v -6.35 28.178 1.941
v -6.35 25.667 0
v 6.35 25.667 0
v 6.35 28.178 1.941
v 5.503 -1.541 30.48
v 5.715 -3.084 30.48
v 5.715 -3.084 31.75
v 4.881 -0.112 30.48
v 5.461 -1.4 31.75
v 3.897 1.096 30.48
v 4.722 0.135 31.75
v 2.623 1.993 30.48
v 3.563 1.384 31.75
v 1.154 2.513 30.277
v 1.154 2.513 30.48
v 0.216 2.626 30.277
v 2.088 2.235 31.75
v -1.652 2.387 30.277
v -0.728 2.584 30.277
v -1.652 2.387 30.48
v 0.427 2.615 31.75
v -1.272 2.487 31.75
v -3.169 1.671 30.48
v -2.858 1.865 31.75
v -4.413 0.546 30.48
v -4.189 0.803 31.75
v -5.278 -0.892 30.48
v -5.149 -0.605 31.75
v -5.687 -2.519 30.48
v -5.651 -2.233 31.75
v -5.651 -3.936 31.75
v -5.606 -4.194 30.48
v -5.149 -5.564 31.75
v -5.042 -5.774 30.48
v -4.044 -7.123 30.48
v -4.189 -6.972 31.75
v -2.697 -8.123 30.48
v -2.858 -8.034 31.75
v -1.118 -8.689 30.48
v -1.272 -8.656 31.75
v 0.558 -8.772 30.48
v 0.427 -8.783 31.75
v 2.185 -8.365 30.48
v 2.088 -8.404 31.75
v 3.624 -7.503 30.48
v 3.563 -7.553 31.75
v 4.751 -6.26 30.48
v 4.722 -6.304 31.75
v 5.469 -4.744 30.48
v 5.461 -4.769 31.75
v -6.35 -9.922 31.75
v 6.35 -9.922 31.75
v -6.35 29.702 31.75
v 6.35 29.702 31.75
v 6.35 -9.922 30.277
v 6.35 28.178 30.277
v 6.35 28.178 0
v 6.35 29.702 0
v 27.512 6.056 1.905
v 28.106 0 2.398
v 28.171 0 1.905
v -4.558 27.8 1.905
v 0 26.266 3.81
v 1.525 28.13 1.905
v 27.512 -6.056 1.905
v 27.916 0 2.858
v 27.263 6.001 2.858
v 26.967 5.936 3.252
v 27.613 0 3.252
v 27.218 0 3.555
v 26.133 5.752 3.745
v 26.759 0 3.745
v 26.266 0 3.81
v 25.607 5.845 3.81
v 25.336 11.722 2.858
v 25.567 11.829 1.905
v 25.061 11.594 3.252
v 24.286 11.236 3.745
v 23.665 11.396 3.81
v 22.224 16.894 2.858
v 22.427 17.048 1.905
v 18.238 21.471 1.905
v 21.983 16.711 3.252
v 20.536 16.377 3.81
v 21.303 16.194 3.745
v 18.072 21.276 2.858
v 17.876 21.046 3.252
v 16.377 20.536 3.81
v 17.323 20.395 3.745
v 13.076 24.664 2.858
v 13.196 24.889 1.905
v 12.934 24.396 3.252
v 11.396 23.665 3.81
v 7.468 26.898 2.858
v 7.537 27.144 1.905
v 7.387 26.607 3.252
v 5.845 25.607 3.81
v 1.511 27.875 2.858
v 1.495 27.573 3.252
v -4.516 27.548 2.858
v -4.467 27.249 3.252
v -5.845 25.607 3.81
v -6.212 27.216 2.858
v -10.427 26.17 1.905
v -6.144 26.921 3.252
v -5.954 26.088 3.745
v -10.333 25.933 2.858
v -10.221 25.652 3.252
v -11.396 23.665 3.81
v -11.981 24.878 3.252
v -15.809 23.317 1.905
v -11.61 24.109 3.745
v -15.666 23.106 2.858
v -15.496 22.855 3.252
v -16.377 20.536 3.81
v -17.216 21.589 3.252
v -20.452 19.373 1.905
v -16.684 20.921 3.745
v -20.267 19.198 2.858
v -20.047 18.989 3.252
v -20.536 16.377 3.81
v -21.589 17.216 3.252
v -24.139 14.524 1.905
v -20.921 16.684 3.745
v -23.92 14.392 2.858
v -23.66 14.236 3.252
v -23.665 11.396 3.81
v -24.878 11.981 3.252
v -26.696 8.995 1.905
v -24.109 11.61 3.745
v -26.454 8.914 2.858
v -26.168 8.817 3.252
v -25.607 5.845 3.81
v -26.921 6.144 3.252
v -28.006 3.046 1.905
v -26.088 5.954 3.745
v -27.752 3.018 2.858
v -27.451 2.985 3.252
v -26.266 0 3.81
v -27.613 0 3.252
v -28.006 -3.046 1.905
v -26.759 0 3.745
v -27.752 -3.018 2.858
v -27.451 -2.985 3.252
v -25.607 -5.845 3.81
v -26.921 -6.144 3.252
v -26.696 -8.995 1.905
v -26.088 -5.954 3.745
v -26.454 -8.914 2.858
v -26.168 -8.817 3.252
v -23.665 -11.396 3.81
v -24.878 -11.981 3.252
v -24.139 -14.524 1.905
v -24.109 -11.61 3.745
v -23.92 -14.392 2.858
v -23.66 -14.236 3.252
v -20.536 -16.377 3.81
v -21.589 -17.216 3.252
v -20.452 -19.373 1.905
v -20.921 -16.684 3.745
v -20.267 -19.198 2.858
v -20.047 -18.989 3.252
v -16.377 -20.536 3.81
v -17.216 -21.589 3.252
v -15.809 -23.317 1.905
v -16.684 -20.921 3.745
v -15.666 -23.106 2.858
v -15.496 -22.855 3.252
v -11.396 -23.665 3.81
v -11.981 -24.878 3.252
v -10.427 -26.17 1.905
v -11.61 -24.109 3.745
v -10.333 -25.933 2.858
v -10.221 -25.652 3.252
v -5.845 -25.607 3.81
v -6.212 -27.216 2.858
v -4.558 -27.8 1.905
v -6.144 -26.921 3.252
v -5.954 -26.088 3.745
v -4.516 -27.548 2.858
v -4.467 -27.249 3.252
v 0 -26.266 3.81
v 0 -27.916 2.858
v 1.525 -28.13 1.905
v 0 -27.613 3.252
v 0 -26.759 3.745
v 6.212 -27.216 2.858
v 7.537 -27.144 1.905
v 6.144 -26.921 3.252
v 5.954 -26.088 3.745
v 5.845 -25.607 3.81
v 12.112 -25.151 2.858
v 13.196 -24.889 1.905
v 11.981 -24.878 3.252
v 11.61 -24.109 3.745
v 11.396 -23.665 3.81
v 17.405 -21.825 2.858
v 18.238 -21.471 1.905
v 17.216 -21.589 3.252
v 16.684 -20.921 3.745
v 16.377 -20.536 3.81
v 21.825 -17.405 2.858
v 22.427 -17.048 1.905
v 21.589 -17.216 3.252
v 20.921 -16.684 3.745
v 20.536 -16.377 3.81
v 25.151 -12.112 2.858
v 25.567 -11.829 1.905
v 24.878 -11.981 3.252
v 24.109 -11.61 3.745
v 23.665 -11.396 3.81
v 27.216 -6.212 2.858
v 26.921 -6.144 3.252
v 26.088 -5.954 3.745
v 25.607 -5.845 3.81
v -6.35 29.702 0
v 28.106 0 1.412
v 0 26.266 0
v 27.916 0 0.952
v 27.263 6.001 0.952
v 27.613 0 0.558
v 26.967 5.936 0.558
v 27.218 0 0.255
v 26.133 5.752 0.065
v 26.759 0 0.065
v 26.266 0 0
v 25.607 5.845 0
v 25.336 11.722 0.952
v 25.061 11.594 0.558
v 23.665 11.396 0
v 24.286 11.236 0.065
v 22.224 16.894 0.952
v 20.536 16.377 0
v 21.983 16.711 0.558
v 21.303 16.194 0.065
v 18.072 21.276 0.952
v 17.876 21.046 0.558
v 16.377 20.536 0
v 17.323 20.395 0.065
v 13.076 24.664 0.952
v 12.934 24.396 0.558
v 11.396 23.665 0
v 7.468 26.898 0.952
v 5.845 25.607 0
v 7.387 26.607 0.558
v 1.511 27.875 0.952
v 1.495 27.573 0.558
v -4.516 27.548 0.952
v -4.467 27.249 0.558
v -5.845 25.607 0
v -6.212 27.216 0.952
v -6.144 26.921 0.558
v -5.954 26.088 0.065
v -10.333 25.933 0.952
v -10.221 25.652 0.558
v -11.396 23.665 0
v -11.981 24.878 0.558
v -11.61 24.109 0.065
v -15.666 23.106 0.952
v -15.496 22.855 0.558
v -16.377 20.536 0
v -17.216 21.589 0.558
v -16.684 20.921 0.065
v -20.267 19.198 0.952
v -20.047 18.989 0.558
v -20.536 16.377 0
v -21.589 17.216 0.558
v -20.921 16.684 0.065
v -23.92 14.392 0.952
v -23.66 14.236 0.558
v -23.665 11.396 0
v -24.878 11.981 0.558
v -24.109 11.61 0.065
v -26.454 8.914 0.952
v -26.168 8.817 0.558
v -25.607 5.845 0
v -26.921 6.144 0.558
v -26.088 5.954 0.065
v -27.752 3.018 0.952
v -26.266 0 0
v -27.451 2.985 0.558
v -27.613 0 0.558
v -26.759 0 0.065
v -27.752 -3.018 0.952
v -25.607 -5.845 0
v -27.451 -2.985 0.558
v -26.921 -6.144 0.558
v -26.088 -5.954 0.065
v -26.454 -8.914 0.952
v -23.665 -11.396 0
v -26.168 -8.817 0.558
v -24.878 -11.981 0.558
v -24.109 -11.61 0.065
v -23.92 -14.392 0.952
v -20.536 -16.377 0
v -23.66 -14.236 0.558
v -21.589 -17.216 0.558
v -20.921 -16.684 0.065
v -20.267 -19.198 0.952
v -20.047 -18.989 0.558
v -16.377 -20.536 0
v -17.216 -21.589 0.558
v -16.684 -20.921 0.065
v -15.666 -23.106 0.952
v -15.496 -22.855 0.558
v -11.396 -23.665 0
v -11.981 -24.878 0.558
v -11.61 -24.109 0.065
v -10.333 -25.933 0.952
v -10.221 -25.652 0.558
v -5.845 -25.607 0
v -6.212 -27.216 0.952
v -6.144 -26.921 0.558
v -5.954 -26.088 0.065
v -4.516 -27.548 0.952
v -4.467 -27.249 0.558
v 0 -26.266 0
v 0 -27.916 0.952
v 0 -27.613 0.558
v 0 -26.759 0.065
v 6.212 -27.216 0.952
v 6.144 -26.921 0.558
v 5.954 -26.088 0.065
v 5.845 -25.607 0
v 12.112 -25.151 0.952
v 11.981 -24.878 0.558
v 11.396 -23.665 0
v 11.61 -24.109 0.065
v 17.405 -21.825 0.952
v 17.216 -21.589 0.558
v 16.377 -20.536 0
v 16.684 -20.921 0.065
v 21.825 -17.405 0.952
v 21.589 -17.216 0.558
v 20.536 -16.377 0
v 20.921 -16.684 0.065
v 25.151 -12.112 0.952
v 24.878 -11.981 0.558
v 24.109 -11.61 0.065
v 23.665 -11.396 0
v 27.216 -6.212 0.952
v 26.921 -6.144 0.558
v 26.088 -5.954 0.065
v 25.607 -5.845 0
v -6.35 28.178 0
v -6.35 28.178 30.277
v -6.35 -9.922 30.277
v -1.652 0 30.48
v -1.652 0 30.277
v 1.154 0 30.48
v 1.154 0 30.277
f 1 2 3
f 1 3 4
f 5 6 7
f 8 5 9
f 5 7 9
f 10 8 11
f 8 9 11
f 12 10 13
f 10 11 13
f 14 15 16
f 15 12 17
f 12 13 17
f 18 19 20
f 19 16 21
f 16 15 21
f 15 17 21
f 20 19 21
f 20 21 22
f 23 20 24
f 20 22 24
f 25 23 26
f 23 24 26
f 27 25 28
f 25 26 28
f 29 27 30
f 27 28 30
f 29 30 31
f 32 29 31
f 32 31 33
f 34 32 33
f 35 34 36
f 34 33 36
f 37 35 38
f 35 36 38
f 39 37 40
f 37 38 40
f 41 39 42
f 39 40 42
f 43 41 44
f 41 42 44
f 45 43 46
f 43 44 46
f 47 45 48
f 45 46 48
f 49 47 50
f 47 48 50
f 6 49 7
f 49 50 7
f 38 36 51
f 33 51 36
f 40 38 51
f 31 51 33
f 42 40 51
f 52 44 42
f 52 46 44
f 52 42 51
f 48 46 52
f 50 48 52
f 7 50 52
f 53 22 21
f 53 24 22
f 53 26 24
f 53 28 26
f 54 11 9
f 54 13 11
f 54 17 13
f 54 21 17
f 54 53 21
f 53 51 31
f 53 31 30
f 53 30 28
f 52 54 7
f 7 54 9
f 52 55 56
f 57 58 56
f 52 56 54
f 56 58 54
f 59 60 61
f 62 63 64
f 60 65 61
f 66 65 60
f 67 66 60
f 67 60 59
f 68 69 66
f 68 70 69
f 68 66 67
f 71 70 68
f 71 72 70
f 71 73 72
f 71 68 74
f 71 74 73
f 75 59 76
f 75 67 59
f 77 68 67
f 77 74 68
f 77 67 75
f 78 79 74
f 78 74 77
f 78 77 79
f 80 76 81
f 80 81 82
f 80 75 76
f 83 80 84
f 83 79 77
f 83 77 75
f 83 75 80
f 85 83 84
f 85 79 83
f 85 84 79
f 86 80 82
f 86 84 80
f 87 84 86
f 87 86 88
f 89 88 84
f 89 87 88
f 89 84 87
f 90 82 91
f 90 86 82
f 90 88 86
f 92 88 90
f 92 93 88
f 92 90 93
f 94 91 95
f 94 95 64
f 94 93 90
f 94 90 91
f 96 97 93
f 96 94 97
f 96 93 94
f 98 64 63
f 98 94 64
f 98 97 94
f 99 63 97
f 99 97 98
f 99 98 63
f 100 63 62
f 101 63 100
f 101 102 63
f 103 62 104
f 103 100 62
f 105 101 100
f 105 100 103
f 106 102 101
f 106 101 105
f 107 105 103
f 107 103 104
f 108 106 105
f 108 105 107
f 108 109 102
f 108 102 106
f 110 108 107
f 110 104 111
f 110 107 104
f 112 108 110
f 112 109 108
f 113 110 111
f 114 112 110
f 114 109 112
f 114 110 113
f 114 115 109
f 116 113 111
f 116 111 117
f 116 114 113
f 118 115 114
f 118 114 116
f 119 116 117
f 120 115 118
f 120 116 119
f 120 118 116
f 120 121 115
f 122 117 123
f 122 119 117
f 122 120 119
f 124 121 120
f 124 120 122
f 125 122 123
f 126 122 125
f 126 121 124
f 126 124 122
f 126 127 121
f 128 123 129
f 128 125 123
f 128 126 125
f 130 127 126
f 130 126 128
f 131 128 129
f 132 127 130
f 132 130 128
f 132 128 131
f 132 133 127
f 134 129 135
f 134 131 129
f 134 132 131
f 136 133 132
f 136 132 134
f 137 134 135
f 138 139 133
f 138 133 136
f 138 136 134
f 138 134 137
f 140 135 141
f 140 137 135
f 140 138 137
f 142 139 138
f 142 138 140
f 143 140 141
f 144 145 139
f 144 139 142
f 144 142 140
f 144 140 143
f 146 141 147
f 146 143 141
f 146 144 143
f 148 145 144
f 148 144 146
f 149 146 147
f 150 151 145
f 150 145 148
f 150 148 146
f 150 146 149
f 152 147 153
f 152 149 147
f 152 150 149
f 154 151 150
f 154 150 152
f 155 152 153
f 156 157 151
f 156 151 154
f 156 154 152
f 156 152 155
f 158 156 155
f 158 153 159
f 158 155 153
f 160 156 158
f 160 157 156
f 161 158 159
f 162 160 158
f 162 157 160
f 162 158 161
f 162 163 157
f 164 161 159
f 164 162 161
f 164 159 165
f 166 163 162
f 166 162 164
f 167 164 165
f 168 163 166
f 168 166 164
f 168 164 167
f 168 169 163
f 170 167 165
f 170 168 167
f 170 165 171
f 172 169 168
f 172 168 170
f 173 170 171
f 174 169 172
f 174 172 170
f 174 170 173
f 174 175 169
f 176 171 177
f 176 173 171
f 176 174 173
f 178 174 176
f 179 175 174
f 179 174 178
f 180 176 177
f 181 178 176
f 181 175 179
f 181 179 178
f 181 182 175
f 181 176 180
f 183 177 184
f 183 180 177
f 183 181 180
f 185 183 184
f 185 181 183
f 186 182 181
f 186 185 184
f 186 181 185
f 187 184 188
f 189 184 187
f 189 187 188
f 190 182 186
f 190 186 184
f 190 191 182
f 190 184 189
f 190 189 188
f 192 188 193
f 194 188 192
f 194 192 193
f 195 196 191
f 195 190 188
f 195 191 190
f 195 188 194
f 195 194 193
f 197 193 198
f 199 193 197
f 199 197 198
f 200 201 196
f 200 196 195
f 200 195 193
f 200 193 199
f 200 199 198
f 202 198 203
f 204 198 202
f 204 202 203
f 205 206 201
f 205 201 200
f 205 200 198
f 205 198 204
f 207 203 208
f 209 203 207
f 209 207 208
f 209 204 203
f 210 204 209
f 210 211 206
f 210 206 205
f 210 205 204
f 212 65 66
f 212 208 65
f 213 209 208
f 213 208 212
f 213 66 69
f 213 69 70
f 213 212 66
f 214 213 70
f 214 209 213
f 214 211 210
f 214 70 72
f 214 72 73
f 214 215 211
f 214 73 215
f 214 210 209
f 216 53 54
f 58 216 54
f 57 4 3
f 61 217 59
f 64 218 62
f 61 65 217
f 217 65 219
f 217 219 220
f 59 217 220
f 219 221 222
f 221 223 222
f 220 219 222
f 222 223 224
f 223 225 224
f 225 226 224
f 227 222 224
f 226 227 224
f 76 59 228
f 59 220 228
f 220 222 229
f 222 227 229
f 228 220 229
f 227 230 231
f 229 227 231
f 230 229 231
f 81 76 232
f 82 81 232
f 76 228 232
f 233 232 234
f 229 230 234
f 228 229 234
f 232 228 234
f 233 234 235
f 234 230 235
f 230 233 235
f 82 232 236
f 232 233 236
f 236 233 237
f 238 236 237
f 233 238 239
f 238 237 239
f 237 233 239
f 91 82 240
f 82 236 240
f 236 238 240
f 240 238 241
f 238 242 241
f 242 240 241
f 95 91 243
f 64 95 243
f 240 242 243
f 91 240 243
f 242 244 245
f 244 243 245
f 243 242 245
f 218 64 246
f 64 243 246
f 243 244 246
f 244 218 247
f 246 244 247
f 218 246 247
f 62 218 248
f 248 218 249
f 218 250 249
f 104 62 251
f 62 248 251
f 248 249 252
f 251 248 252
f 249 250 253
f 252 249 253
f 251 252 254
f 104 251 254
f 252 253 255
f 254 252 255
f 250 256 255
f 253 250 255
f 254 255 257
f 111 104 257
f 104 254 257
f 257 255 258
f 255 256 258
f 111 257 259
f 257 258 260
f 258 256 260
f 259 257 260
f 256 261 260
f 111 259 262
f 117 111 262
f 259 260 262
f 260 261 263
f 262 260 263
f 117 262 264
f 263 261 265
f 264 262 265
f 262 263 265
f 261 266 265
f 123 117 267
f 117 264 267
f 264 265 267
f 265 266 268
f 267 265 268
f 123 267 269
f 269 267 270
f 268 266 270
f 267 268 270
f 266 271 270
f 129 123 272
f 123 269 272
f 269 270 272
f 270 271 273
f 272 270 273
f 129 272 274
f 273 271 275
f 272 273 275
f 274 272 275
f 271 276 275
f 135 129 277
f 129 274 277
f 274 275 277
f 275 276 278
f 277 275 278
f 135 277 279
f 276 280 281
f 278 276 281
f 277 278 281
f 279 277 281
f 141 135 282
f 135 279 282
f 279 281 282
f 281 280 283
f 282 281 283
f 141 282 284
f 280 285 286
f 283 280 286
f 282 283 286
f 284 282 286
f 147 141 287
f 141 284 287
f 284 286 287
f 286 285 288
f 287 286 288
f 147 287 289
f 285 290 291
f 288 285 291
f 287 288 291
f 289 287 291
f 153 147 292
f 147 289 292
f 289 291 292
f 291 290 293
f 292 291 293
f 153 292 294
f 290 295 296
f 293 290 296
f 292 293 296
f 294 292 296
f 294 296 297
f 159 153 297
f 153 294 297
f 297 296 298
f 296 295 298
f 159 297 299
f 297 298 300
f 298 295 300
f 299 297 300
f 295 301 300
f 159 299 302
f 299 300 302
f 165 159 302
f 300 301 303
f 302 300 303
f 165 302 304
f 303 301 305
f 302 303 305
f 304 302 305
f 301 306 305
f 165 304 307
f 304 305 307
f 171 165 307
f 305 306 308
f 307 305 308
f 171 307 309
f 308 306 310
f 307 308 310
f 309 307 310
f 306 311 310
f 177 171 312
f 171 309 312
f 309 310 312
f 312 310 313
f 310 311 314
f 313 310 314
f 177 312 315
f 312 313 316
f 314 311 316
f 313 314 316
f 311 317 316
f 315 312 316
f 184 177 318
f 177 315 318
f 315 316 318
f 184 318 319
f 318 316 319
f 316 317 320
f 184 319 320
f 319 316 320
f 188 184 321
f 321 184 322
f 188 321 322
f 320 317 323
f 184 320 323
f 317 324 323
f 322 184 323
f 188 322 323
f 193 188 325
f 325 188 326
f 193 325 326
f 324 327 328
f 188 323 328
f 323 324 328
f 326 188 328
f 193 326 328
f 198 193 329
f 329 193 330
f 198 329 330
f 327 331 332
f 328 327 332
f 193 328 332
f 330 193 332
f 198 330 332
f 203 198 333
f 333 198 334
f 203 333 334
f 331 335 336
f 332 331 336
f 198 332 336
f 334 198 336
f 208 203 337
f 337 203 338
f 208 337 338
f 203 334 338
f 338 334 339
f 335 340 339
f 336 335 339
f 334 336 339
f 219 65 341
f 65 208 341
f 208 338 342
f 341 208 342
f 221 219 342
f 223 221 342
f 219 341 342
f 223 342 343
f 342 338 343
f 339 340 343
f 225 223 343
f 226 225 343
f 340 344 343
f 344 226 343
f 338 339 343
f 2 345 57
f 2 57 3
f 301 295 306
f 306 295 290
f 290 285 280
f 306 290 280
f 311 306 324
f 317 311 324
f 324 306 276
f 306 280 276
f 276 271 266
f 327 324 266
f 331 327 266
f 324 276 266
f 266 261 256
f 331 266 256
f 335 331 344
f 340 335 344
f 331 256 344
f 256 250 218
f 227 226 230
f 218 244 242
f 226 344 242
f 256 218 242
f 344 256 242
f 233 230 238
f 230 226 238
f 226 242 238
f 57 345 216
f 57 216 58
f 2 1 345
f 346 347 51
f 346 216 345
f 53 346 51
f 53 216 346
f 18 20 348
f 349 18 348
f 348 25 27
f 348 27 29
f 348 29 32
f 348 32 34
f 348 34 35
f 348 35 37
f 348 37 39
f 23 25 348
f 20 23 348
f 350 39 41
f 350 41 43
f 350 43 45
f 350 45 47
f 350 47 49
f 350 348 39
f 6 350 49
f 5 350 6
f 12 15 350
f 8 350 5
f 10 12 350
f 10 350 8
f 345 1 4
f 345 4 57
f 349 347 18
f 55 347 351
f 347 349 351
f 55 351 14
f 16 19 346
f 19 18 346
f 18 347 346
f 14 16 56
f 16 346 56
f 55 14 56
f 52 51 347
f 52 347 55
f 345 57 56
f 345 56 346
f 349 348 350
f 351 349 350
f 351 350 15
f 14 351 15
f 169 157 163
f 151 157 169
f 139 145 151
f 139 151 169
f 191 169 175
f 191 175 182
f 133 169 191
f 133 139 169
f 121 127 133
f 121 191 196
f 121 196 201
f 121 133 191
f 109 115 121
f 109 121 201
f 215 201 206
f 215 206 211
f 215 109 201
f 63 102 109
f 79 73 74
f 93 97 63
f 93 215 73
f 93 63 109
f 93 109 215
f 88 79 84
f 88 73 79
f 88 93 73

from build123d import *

# Parameters (mm, degrees)
F0_R      = 28.1709911247
F1_DEPTH  = 3.81
F2_R      = 1.90499
F4_DEPTH  = 31.75
F5_W      = 12.7
F5_H      = 1.4726919234
F6_DEPTH  = 38.1
F8_DEPTH  = 12.7
F9_R      = 5.715
F10_DEPTH = 1.27
F12_DEPTH = 25.4


# Not quite as in the source:
# - a fillet or chamfer is up to 0.001 mm smaller than in the source, because OpenCascade refuses the exact size


with BuildPart() as f1:
    # F0 (on Top) → F1 (new body)
    with BuildSketch(Plane.XY):
        Circle(F0_R)
    extrude(amount=F1_DEPTH)

    # F2 (radius 1.905 in the source; OpenCascade refuses exactly that, so slightly less here)
    f2_edges = [f1.edges().sort_by_distance(p)[0] for p in [
        (-28.170991, 0, 3.81),
        (-28.170991, 0, 0),
    ]]
    fillet(f2_edges, radius=F2_R)


with BuildPart() as f4:
    # F3 (on face) → F4 (new body)
    with BuildSketch(Plane(origin=(0, 0, 0), x_dir=(1, 0, 0), z_dir=(0, 0, -1))):
        Polygon((6.35, -28.1780194491), (0, -28.1780194491), (-6.35, -28.1780194491), (-6.35, -29.7020194491), (6.35, -29.7020194491), align=None)
    extrude(amount=-F4_DEPTH)

    # F5 (on face) → F6 (join)
    with BuildSketch(Plane.XZ.offset(-28.1780194491)):
        with Locations((0, 31.0136540383)):
            Rectangle(F5_W, F5_H)
    extrude(amount=F6_DEPTH)

    # F9 (on face) → F10 (cut)
    with BuildSketch(Plane.XY.offset(31.75)):
        with Locations((0, -3.0844647083)):
            Circle(F9_R)
    extrude(amount=-F10_DEPTH, mode=Mode.SUBTRACT)

    # F11 (on face) → F12 (cut)
    with BuildSketch(Plane.XY.offset(30.48)):
        with BuildLine():
            ThreePointArc((1.1540995911, 2.5127916851), (-0.2566010446, 2.6247717471), (-1.6515682438, 2.3866912332))
            Line((-1.6515682438, 2.3866912332), (-1.6515682438, 0))
            Line((-1.6515682438, 0), (1.1540995911, 0))
            Line((1.1540995911, 0), (1.1540995911, 2.5127916851))
        make_face()
    extrude(amount=-F12_DEPTH, mode=Mode.SUBTRACT)


with BuildPart() as f8:
    # F7 (on face) → F8 (new body)
    with BuildSketch(Plane(origin=(-6.35, 0, 0), x_dir=(0, -1, 0), z_dir=(-1, 0, 0))):
        Polygon((-28.1780194491, 1.9405478379), (-28.1780194491, 0), (-25.6668012589, 0), align=None)
    extrude(amount=-F8_DEPTH)


solid = Compound([f1.part, f4.part, f8.part])
